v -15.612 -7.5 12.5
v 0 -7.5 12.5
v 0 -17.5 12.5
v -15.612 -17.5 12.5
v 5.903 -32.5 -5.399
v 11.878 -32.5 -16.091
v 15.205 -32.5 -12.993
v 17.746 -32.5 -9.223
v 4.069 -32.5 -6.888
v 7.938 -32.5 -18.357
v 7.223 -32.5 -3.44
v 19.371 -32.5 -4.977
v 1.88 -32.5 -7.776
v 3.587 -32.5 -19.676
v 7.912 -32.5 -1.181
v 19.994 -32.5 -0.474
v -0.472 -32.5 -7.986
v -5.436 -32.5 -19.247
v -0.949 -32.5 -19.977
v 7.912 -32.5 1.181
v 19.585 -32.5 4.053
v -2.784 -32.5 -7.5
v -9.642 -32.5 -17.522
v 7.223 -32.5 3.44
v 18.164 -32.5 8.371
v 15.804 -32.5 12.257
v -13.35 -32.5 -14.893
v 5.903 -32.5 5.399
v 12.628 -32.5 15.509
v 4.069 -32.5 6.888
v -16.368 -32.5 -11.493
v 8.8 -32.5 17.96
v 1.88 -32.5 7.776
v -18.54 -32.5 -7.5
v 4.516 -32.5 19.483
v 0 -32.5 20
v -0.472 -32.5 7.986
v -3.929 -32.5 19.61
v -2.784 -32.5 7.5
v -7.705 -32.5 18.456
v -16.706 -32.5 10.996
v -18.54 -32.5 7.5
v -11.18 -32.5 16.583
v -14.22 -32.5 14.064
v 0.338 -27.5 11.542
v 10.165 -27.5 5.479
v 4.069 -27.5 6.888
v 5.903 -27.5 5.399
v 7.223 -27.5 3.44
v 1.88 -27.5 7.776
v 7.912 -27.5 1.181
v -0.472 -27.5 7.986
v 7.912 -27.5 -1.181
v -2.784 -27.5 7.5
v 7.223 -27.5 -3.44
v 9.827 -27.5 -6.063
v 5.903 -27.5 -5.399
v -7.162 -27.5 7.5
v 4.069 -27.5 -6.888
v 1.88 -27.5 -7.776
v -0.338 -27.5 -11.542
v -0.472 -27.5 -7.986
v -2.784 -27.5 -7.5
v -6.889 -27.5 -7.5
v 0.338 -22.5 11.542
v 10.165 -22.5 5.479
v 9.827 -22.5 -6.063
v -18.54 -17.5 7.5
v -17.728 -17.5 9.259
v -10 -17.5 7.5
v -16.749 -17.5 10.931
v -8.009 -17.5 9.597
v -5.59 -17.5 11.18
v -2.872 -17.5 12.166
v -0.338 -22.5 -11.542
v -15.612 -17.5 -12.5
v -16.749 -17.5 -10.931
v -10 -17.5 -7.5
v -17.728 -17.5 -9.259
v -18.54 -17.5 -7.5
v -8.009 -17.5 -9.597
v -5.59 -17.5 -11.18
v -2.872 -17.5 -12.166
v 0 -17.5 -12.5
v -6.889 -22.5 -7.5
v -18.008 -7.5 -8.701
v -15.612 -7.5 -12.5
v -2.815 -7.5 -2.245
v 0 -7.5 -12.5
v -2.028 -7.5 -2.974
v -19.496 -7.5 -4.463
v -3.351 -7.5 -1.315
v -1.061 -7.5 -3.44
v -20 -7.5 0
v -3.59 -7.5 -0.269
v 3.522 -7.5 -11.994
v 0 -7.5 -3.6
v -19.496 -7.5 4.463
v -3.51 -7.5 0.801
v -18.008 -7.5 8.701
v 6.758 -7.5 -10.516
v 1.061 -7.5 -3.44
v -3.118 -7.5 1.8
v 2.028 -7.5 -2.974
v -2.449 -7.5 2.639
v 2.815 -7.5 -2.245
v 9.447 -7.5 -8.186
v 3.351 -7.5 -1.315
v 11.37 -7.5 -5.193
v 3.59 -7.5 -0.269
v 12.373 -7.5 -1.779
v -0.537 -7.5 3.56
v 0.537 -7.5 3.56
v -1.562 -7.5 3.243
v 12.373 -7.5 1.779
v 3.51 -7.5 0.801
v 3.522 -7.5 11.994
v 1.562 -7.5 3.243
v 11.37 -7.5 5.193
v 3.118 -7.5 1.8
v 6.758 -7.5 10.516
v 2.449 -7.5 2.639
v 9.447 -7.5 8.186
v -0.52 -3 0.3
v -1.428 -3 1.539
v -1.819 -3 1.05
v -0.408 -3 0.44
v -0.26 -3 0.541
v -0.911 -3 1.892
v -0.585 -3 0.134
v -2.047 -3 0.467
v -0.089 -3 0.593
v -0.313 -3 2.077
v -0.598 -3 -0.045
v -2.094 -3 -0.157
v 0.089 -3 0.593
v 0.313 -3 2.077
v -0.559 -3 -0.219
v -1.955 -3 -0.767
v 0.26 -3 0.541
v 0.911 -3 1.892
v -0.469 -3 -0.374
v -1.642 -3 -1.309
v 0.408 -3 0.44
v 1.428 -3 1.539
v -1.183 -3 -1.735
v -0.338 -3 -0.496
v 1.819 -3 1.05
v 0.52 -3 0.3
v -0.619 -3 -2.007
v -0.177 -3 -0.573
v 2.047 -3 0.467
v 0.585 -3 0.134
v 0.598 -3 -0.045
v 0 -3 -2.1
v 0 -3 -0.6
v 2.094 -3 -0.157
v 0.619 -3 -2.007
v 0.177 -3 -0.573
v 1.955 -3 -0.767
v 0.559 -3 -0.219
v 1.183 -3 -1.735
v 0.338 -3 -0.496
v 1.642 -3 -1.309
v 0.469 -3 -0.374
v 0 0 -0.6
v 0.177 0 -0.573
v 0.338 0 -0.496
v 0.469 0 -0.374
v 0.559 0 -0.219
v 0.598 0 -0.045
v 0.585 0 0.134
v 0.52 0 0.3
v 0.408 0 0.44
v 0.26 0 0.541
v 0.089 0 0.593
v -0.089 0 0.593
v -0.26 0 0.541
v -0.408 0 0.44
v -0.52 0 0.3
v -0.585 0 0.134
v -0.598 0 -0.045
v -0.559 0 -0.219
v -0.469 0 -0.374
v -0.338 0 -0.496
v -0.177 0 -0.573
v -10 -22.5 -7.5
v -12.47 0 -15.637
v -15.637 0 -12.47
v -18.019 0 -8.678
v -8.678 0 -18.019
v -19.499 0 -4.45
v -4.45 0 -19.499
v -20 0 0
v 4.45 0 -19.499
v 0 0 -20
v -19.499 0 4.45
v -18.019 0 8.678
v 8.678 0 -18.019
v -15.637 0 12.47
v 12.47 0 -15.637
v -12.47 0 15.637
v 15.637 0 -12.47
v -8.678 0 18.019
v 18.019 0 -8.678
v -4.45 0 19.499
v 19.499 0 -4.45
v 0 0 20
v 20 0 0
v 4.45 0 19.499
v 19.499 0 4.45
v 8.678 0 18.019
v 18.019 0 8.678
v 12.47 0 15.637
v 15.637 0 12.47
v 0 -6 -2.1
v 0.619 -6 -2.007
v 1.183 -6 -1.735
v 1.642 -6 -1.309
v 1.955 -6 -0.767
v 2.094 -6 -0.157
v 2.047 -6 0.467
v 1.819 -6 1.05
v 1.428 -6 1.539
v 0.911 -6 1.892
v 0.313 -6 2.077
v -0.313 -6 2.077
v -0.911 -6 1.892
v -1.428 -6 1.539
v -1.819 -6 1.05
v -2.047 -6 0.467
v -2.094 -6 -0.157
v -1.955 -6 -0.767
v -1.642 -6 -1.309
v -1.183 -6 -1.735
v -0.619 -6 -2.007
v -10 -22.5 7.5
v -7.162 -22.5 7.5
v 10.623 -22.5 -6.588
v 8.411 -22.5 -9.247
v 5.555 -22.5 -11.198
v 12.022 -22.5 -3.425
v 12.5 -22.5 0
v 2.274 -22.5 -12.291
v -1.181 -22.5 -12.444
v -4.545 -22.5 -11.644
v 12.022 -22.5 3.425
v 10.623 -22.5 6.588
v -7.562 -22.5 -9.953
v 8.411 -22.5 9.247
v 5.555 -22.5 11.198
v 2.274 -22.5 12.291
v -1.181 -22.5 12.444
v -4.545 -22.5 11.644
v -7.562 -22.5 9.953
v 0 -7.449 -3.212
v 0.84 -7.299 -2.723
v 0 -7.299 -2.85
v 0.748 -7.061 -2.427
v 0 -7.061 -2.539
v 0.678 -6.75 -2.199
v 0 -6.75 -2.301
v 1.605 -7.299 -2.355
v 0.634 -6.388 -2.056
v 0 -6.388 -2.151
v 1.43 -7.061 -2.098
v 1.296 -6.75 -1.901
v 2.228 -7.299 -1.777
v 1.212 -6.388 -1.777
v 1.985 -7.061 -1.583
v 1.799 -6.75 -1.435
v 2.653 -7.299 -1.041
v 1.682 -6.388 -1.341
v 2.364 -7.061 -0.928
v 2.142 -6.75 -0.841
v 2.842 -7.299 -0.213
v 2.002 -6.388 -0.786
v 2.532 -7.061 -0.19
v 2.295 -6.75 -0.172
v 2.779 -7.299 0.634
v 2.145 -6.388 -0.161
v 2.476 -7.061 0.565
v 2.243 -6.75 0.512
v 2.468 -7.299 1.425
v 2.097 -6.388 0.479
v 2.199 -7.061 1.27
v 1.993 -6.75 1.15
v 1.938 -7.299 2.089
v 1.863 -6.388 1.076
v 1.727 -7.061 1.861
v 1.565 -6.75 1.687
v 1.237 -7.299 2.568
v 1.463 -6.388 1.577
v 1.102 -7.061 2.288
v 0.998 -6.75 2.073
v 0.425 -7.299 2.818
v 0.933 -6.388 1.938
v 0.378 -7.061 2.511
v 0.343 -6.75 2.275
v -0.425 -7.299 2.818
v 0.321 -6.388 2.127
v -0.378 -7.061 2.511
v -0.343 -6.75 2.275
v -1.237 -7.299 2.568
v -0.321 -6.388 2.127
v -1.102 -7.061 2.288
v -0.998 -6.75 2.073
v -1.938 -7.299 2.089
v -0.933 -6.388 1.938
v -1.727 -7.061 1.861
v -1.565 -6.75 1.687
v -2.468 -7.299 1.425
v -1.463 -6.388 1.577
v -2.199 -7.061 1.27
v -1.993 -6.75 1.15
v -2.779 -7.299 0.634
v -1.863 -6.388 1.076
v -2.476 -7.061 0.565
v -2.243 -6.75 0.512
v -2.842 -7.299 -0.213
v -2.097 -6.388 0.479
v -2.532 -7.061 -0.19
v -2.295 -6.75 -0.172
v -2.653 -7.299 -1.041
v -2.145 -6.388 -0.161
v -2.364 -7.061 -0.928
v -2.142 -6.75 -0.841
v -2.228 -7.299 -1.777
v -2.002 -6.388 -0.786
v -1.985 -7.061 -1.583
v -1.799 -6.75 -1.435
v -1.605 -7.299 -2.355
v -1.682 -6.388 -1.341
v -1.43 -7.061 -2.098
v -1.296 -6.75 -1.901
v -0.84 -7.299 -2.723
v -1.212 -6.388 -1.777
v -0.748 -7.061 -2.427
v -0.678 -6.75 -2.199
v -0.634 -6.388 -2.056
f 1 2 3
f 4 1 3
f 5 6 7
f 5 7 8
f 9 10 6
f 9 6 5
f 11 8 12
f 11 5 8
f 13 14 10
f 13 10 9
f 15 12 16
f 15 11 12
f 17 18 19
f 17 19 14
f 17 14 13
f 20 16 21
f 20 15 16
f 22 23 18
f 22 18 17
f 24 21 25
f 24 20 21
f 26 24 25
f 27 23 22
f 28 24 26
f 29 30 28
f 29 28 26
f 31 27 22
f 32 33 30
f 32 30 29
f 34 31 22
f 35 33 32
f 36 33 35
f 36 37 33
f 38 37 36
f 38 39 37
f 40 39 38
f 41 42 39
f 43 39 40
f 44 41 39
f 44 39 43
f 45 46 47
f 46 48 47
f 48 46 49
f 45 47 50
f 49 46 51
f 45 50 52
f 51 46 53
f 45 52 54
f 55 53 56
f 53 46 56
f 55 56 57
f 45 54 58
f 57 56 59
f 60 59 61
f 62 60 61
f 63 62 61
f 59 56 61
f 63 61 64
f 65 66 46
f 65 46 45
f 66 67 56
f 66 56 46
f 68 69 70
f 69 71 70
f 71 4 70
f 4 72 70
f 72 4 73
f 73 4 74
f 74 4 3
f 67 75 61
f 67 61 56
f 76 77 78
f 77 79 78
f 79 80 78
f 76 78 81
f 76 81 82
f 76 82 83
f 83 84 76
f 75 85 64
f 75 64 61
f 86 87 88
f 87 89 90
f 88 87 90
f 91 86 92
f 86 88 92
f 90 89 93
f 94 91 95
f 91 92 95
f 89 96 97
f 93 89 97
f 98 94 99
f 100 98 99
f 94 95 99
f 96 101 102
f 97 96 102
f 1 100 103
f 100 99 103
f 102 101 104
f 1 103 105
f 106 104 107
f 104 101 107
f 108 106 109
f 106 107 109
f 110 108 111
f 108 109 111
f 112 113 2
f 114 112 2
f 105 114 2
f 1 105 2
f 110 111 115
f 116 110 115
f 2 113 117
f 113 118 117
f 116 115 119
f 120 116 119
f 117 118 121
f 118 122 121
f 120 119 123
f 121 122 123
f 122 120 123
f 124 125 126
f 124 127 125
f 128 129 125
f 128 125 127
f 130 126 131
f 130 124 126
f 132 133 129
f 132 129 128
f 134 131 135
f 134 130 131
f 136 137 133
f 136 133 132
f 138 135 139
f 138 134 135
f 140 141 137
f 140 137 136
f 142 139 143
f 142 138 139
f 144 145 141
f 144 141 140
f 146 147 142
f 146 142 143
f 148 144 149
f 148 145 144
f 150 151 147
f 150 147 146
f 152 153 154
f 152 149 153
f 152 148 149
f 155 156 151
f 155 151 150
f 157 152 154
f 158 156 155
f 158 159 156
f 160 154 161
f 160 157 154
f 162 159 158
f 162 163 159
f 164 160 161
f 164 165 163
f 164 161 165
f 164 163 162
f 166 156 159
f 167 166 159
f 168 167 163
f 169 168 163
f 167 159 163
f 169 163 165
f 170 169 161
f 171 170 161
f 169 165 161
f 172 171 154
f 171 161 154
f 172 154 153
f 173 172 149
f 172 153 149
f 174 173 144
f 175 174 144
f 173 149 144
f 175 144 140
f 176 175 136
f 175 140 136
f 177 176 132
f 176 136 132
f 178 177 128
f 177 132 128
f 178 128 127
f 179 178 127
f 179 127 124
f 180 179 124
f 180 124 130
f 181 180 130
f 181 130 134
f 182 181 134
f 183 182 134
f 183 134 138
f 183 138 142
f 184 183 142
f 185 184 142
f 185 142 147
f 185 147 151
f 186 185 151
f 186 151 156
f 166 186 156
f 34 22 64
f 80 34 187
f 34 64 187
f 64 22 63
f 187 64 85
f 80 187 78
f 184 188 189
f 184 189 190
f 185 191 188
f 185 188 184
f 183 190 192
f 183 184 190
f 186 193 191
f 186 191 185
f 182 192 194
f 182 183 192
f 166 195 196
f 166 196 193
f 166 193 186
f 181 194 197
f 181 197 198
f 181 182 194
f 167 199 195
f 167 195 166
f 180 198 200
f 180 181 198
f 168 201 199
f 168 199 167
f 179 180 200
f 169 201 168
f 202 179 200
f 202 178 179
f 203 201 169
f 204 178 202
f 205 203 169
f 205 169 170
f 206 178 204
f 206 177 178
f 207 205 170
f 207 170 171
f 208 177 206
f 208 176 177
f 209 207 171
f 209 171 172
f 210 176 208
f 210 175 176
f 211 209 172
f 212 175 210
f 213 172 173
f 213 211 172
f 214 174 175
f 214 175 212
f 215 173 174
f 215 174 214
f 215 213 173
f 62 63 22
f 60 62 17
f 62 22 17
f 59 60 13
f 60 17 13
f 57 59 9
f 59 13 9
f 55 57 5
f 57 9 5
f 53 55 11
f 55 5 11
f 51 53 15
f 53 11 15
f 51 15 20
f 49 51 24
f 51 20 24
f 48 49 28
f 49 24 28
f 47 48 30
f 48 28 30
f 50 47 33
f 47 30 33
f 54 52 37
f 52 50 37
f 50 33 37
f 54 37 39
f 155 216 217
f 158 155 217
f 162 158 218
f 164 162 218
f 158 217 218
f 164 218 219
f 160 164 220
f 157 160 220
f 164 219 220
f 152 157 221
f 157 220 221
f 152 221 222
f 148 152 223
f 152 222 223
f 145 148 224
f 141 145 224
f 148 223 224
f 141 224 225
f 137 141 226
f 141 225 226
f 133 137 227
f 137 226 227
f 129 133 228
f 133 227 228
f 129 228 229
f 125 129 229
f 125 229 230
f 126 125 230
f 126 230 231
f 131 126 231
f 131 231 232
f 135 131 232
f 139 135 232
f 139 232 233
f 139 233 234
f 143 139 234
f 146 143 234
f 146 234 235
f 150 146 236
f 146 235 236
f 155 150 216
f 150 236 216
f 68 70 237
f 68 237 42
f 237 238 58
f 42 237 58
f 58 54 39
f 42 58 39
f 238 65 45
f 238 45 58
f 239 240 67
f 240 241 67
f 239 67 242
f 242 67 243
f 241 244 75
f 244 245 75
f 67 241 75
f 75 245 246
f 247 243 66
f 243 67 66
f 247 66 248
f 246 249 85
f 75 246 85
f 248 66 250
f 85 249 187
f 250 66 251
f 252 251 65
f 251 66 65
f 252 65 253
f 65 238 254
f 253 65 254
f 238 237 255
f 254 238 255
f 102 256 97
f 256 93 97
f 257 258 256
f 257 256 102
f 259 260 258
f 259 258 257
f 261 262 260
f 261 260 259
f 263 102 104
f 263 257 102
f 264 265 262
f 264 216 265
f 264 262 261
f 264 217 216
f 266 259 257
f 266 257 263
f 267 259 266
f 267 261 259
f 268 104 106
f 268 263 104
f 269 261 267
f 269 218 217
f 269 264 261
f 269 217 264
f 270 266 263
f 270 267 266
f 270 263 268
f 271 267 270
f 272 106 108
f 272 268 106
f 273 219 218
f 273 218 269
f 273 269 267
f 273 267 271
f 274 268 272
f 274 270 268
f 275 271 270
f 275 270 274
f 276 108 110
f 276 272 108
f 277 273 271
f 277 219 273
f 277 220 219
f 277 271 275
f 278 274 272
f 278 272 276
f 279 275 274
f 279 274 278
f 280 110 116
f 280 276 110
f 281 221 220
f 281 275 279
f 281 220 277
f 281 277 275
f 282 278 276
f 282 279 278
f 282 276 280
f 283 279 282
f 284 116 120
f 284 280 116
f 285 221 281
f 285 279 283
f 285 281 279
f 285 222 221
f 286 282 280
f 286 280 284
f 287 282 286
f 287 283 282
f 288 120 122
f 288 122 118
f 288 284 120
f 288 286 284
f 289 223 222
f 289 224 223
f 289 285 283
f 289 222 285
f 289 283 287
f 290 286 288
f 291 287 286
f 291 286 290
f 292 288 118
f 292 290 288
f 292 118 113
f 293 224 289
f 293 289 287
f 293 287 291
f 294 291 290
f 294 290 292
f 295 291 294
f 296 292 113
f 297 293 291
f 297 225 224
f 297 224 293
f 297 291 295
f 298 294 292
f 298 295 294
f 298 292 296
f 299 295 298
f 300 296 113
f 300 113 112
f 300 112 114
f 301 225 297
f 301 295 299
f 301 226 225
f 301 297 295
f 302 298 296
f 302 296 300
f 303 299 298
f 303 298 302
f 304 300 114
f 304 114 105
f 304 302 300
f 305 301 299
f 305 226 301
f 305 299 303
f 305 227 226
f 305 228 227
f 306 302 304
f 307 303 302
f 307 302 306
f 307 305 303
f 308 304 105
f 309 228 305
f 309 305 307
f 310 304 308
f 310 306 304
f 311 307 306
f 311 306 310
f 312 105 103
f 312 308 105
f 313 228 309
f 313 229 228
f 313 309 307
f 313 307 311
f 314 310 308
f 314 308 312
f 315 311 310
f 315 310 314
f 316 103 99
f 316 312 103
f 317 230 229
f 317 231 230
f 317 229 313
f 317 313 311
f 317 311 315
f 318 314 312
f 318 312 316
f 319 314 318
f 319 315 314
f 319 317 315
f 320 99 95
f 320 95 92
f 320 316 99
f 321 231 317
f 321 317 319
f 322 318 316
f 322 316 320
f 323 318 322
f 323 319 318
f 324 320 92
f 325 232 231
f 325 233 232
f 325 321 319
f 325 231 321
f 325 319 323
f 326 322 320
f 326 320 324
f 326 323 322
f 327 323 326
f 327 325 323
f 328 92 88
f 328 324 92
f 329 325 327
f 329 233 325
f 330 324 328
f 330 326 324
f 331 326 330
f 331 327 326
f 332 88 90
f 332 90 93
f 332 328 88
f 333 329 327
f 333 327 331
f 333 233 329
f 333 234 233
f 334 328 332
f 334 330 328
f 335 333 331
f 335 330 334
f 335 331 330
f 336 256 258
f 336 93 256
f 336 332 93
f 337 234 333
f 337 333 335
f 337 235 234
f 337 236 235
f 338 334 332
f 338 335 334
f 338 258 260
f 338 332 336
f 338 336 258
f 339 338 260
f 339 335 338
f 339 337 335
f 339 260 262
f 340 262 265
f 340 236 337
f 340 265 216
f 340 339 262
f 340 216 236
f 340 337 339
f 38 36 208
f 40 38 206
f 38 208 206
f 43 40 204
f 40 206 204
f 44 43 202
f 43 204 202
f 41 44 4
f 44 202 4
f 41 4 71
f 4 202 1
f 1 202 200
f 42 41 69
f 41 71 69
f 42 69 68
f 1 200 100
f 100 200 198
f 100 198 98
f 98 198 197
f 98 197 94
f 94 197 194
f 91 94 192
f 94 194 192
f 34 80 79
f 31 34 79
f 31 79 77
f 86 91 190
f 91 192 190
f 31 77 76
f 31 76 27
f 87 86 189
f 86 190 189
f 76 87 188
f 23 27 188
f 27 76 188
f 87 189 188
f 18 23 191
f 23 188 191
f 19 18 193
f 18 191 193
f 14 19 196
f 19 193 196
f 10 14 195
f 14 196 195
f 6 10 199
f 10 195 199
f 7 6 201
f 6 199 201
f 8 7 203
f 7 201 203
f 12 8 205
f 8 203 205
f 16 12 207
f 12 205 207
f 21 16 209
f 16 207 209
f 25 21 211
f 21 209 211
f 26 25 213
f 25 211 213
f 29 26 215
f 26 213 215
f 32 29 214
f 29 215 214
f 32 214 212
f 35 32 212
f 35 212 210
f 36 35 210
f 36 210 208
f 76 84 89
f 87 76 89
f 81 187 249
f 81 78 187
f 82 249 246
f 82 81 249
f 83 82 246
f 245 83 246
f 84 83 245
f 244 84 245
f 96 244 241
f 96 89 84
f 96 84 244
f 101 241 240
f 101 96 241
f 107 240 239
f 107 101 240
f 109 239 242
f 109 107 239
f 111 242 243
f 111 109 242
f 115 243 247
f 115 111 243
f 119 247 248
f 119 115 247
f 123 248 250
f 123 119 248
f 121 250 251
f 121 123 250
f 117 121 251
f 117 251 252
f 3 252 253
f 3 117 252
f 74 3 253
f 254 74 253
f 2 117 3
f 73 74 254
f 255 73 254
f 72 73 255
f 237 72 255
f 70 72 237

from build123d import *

# Parameters (mm, degrees)
SKETCH1_R           = 20
BOSS_EXTRUDE1_DEPTH = 7.5
SKETCH2_R           = 20
SKETCH2_R_2         = 12.5
BOSS_EXTRUDE2_DEPTH = 15
SKETCH3_R           = 20
BOSS_EXTRUDE3_DEPTH = 10
CUT_EXTRUDE2_DEPTH  = 5
CUT_EXTRUDE3_DEPTH  = 44.084219849
SKETCH6_R           = 8
CUT_EXTRUDE4_DEPTH  = 5
SKETCH7_R           = 2.1
CUT_EXTRUDE5_DEPTH  = 4.5
SKETCH8_R           = 0.6
CUT_EXTRUDE6_DEPTH  = 41.868692174
FILLET1_R           = 1.5


with BuildPart() as part:
    # Sketch1 → Boss-Extrude1 (new body)
    with BuildSketch(Plane(origin=(0, 0, 0), x_dir=(1, 0, 0), z_dir=(0, 1, 0))):
        with Locations(Location((0, 0, 0), (0, 0, 270))):
            Circle(SKETCH1_R)
    extrude(amount=-BOSS_EXTRUDE1_DEPTH)

    # Sketch2 → Boss-Extrude2 (add)
    with BuildSketch(Plane.XZ.offset(7.5)):
        with Locations(Location((0, 0, 0), (0, 0, 90))):
            Circle(SKETCH2_R)
        with Locations(Location((0, 0, 0), (0, 0, 270))):
            Circle(SKETCH2_R_2, mode=Mode.SUBTRACT)
    extrude(amount=BOSS_EXTRUDE2_DEPTH)

    # Sketch3 → Boss-Extrude3 (add)
    with BuildSketch(Plane.XZ.offset(22.5)):
        with Locations(Location((0, 0, 0), (0, 0, 90))):
            Circle(SKETCH3_R)
    extrude(amount=BOSS_EXTRUDE3_DEPTH)

    # Sketch4 → Cut-Extrude2 (cut)
    with BuildSketch(Plane(origin=(0, -22.5, 0), x_dir=(-1, 0, 0), z_dir=(0, -1, 0))):
        Polygon((10.164510853, 5.47869076), (0.337570049, 11.542069996), (-9.826940805, 6.063379236), (-10.164510853, -5.47869076), (-0.337570049, -11.542069996), (9.826940805, -6.063379236), align=None)
    extrude(amount=CUT_EXTRUDE2_DEPTH, mode=Mode.SUBTRACT)

    # Sketch5 → Cut-Extrude3 (cut, through all)
    with BuildSketch(Plane(origin=(0, 0, 0), x_dir=(0, 0, -1), z_dir=(1, 0, 0))):
        Polygon((7.5, -17.5), (12.5, -17.5), (12.5, -7.5), (-12.5, -7.5), (-12.5, -17.5), (-7.5, -17.5), (-7.5, -32.5), (7.5, -32.5), align=None)
    extrude(amount=-CUT_EXTRUDE3_DEPTH, mode=Mode.SUBTRACT)

    # Sketch6 → Cut-Extrude4 (cut)
    with BuildSketch(Plane.XZ.offset(32.5)):
        Circle(SKETCH6_R)
    extrude(amount=-CUT_EXTRUDE4_DEPTH, mode=Mode.SUBTRACT)

    # Sketch7 → Cut-Extrude5 (cut)
    with BuildSketch(Plane.XZ.offset(7.5)):
        with Locations(Location((0, 0, 0), (0, 0, 270))):
            Circle(SKETCH7_R)
    extrude(amount=-CUT_EXTRUDE5_DEPTH, mode=Mode.SUBTRACT)

    # Sketch8 → Cut-Extrude6 (cut, through all)
    with BuildSketch(Plane.XZ.offset(3)):
        with Locations(Location((0, 0, 0), (0, 0, 270))):
            Circle(SKETCH8_R)
    extrude(amount=-CUT_EXTRUDE6_DEPTH, mode=Mode.SUBTRACT)

    # Fillet1
    fillet1_edges = [part.edges().sort_by_distance(p)[0] for p in [
        (0, -7.5, 2.1),
    ]]
    fillet(fillet1_edges, radius=FILLET1_R)


solid = part.part
